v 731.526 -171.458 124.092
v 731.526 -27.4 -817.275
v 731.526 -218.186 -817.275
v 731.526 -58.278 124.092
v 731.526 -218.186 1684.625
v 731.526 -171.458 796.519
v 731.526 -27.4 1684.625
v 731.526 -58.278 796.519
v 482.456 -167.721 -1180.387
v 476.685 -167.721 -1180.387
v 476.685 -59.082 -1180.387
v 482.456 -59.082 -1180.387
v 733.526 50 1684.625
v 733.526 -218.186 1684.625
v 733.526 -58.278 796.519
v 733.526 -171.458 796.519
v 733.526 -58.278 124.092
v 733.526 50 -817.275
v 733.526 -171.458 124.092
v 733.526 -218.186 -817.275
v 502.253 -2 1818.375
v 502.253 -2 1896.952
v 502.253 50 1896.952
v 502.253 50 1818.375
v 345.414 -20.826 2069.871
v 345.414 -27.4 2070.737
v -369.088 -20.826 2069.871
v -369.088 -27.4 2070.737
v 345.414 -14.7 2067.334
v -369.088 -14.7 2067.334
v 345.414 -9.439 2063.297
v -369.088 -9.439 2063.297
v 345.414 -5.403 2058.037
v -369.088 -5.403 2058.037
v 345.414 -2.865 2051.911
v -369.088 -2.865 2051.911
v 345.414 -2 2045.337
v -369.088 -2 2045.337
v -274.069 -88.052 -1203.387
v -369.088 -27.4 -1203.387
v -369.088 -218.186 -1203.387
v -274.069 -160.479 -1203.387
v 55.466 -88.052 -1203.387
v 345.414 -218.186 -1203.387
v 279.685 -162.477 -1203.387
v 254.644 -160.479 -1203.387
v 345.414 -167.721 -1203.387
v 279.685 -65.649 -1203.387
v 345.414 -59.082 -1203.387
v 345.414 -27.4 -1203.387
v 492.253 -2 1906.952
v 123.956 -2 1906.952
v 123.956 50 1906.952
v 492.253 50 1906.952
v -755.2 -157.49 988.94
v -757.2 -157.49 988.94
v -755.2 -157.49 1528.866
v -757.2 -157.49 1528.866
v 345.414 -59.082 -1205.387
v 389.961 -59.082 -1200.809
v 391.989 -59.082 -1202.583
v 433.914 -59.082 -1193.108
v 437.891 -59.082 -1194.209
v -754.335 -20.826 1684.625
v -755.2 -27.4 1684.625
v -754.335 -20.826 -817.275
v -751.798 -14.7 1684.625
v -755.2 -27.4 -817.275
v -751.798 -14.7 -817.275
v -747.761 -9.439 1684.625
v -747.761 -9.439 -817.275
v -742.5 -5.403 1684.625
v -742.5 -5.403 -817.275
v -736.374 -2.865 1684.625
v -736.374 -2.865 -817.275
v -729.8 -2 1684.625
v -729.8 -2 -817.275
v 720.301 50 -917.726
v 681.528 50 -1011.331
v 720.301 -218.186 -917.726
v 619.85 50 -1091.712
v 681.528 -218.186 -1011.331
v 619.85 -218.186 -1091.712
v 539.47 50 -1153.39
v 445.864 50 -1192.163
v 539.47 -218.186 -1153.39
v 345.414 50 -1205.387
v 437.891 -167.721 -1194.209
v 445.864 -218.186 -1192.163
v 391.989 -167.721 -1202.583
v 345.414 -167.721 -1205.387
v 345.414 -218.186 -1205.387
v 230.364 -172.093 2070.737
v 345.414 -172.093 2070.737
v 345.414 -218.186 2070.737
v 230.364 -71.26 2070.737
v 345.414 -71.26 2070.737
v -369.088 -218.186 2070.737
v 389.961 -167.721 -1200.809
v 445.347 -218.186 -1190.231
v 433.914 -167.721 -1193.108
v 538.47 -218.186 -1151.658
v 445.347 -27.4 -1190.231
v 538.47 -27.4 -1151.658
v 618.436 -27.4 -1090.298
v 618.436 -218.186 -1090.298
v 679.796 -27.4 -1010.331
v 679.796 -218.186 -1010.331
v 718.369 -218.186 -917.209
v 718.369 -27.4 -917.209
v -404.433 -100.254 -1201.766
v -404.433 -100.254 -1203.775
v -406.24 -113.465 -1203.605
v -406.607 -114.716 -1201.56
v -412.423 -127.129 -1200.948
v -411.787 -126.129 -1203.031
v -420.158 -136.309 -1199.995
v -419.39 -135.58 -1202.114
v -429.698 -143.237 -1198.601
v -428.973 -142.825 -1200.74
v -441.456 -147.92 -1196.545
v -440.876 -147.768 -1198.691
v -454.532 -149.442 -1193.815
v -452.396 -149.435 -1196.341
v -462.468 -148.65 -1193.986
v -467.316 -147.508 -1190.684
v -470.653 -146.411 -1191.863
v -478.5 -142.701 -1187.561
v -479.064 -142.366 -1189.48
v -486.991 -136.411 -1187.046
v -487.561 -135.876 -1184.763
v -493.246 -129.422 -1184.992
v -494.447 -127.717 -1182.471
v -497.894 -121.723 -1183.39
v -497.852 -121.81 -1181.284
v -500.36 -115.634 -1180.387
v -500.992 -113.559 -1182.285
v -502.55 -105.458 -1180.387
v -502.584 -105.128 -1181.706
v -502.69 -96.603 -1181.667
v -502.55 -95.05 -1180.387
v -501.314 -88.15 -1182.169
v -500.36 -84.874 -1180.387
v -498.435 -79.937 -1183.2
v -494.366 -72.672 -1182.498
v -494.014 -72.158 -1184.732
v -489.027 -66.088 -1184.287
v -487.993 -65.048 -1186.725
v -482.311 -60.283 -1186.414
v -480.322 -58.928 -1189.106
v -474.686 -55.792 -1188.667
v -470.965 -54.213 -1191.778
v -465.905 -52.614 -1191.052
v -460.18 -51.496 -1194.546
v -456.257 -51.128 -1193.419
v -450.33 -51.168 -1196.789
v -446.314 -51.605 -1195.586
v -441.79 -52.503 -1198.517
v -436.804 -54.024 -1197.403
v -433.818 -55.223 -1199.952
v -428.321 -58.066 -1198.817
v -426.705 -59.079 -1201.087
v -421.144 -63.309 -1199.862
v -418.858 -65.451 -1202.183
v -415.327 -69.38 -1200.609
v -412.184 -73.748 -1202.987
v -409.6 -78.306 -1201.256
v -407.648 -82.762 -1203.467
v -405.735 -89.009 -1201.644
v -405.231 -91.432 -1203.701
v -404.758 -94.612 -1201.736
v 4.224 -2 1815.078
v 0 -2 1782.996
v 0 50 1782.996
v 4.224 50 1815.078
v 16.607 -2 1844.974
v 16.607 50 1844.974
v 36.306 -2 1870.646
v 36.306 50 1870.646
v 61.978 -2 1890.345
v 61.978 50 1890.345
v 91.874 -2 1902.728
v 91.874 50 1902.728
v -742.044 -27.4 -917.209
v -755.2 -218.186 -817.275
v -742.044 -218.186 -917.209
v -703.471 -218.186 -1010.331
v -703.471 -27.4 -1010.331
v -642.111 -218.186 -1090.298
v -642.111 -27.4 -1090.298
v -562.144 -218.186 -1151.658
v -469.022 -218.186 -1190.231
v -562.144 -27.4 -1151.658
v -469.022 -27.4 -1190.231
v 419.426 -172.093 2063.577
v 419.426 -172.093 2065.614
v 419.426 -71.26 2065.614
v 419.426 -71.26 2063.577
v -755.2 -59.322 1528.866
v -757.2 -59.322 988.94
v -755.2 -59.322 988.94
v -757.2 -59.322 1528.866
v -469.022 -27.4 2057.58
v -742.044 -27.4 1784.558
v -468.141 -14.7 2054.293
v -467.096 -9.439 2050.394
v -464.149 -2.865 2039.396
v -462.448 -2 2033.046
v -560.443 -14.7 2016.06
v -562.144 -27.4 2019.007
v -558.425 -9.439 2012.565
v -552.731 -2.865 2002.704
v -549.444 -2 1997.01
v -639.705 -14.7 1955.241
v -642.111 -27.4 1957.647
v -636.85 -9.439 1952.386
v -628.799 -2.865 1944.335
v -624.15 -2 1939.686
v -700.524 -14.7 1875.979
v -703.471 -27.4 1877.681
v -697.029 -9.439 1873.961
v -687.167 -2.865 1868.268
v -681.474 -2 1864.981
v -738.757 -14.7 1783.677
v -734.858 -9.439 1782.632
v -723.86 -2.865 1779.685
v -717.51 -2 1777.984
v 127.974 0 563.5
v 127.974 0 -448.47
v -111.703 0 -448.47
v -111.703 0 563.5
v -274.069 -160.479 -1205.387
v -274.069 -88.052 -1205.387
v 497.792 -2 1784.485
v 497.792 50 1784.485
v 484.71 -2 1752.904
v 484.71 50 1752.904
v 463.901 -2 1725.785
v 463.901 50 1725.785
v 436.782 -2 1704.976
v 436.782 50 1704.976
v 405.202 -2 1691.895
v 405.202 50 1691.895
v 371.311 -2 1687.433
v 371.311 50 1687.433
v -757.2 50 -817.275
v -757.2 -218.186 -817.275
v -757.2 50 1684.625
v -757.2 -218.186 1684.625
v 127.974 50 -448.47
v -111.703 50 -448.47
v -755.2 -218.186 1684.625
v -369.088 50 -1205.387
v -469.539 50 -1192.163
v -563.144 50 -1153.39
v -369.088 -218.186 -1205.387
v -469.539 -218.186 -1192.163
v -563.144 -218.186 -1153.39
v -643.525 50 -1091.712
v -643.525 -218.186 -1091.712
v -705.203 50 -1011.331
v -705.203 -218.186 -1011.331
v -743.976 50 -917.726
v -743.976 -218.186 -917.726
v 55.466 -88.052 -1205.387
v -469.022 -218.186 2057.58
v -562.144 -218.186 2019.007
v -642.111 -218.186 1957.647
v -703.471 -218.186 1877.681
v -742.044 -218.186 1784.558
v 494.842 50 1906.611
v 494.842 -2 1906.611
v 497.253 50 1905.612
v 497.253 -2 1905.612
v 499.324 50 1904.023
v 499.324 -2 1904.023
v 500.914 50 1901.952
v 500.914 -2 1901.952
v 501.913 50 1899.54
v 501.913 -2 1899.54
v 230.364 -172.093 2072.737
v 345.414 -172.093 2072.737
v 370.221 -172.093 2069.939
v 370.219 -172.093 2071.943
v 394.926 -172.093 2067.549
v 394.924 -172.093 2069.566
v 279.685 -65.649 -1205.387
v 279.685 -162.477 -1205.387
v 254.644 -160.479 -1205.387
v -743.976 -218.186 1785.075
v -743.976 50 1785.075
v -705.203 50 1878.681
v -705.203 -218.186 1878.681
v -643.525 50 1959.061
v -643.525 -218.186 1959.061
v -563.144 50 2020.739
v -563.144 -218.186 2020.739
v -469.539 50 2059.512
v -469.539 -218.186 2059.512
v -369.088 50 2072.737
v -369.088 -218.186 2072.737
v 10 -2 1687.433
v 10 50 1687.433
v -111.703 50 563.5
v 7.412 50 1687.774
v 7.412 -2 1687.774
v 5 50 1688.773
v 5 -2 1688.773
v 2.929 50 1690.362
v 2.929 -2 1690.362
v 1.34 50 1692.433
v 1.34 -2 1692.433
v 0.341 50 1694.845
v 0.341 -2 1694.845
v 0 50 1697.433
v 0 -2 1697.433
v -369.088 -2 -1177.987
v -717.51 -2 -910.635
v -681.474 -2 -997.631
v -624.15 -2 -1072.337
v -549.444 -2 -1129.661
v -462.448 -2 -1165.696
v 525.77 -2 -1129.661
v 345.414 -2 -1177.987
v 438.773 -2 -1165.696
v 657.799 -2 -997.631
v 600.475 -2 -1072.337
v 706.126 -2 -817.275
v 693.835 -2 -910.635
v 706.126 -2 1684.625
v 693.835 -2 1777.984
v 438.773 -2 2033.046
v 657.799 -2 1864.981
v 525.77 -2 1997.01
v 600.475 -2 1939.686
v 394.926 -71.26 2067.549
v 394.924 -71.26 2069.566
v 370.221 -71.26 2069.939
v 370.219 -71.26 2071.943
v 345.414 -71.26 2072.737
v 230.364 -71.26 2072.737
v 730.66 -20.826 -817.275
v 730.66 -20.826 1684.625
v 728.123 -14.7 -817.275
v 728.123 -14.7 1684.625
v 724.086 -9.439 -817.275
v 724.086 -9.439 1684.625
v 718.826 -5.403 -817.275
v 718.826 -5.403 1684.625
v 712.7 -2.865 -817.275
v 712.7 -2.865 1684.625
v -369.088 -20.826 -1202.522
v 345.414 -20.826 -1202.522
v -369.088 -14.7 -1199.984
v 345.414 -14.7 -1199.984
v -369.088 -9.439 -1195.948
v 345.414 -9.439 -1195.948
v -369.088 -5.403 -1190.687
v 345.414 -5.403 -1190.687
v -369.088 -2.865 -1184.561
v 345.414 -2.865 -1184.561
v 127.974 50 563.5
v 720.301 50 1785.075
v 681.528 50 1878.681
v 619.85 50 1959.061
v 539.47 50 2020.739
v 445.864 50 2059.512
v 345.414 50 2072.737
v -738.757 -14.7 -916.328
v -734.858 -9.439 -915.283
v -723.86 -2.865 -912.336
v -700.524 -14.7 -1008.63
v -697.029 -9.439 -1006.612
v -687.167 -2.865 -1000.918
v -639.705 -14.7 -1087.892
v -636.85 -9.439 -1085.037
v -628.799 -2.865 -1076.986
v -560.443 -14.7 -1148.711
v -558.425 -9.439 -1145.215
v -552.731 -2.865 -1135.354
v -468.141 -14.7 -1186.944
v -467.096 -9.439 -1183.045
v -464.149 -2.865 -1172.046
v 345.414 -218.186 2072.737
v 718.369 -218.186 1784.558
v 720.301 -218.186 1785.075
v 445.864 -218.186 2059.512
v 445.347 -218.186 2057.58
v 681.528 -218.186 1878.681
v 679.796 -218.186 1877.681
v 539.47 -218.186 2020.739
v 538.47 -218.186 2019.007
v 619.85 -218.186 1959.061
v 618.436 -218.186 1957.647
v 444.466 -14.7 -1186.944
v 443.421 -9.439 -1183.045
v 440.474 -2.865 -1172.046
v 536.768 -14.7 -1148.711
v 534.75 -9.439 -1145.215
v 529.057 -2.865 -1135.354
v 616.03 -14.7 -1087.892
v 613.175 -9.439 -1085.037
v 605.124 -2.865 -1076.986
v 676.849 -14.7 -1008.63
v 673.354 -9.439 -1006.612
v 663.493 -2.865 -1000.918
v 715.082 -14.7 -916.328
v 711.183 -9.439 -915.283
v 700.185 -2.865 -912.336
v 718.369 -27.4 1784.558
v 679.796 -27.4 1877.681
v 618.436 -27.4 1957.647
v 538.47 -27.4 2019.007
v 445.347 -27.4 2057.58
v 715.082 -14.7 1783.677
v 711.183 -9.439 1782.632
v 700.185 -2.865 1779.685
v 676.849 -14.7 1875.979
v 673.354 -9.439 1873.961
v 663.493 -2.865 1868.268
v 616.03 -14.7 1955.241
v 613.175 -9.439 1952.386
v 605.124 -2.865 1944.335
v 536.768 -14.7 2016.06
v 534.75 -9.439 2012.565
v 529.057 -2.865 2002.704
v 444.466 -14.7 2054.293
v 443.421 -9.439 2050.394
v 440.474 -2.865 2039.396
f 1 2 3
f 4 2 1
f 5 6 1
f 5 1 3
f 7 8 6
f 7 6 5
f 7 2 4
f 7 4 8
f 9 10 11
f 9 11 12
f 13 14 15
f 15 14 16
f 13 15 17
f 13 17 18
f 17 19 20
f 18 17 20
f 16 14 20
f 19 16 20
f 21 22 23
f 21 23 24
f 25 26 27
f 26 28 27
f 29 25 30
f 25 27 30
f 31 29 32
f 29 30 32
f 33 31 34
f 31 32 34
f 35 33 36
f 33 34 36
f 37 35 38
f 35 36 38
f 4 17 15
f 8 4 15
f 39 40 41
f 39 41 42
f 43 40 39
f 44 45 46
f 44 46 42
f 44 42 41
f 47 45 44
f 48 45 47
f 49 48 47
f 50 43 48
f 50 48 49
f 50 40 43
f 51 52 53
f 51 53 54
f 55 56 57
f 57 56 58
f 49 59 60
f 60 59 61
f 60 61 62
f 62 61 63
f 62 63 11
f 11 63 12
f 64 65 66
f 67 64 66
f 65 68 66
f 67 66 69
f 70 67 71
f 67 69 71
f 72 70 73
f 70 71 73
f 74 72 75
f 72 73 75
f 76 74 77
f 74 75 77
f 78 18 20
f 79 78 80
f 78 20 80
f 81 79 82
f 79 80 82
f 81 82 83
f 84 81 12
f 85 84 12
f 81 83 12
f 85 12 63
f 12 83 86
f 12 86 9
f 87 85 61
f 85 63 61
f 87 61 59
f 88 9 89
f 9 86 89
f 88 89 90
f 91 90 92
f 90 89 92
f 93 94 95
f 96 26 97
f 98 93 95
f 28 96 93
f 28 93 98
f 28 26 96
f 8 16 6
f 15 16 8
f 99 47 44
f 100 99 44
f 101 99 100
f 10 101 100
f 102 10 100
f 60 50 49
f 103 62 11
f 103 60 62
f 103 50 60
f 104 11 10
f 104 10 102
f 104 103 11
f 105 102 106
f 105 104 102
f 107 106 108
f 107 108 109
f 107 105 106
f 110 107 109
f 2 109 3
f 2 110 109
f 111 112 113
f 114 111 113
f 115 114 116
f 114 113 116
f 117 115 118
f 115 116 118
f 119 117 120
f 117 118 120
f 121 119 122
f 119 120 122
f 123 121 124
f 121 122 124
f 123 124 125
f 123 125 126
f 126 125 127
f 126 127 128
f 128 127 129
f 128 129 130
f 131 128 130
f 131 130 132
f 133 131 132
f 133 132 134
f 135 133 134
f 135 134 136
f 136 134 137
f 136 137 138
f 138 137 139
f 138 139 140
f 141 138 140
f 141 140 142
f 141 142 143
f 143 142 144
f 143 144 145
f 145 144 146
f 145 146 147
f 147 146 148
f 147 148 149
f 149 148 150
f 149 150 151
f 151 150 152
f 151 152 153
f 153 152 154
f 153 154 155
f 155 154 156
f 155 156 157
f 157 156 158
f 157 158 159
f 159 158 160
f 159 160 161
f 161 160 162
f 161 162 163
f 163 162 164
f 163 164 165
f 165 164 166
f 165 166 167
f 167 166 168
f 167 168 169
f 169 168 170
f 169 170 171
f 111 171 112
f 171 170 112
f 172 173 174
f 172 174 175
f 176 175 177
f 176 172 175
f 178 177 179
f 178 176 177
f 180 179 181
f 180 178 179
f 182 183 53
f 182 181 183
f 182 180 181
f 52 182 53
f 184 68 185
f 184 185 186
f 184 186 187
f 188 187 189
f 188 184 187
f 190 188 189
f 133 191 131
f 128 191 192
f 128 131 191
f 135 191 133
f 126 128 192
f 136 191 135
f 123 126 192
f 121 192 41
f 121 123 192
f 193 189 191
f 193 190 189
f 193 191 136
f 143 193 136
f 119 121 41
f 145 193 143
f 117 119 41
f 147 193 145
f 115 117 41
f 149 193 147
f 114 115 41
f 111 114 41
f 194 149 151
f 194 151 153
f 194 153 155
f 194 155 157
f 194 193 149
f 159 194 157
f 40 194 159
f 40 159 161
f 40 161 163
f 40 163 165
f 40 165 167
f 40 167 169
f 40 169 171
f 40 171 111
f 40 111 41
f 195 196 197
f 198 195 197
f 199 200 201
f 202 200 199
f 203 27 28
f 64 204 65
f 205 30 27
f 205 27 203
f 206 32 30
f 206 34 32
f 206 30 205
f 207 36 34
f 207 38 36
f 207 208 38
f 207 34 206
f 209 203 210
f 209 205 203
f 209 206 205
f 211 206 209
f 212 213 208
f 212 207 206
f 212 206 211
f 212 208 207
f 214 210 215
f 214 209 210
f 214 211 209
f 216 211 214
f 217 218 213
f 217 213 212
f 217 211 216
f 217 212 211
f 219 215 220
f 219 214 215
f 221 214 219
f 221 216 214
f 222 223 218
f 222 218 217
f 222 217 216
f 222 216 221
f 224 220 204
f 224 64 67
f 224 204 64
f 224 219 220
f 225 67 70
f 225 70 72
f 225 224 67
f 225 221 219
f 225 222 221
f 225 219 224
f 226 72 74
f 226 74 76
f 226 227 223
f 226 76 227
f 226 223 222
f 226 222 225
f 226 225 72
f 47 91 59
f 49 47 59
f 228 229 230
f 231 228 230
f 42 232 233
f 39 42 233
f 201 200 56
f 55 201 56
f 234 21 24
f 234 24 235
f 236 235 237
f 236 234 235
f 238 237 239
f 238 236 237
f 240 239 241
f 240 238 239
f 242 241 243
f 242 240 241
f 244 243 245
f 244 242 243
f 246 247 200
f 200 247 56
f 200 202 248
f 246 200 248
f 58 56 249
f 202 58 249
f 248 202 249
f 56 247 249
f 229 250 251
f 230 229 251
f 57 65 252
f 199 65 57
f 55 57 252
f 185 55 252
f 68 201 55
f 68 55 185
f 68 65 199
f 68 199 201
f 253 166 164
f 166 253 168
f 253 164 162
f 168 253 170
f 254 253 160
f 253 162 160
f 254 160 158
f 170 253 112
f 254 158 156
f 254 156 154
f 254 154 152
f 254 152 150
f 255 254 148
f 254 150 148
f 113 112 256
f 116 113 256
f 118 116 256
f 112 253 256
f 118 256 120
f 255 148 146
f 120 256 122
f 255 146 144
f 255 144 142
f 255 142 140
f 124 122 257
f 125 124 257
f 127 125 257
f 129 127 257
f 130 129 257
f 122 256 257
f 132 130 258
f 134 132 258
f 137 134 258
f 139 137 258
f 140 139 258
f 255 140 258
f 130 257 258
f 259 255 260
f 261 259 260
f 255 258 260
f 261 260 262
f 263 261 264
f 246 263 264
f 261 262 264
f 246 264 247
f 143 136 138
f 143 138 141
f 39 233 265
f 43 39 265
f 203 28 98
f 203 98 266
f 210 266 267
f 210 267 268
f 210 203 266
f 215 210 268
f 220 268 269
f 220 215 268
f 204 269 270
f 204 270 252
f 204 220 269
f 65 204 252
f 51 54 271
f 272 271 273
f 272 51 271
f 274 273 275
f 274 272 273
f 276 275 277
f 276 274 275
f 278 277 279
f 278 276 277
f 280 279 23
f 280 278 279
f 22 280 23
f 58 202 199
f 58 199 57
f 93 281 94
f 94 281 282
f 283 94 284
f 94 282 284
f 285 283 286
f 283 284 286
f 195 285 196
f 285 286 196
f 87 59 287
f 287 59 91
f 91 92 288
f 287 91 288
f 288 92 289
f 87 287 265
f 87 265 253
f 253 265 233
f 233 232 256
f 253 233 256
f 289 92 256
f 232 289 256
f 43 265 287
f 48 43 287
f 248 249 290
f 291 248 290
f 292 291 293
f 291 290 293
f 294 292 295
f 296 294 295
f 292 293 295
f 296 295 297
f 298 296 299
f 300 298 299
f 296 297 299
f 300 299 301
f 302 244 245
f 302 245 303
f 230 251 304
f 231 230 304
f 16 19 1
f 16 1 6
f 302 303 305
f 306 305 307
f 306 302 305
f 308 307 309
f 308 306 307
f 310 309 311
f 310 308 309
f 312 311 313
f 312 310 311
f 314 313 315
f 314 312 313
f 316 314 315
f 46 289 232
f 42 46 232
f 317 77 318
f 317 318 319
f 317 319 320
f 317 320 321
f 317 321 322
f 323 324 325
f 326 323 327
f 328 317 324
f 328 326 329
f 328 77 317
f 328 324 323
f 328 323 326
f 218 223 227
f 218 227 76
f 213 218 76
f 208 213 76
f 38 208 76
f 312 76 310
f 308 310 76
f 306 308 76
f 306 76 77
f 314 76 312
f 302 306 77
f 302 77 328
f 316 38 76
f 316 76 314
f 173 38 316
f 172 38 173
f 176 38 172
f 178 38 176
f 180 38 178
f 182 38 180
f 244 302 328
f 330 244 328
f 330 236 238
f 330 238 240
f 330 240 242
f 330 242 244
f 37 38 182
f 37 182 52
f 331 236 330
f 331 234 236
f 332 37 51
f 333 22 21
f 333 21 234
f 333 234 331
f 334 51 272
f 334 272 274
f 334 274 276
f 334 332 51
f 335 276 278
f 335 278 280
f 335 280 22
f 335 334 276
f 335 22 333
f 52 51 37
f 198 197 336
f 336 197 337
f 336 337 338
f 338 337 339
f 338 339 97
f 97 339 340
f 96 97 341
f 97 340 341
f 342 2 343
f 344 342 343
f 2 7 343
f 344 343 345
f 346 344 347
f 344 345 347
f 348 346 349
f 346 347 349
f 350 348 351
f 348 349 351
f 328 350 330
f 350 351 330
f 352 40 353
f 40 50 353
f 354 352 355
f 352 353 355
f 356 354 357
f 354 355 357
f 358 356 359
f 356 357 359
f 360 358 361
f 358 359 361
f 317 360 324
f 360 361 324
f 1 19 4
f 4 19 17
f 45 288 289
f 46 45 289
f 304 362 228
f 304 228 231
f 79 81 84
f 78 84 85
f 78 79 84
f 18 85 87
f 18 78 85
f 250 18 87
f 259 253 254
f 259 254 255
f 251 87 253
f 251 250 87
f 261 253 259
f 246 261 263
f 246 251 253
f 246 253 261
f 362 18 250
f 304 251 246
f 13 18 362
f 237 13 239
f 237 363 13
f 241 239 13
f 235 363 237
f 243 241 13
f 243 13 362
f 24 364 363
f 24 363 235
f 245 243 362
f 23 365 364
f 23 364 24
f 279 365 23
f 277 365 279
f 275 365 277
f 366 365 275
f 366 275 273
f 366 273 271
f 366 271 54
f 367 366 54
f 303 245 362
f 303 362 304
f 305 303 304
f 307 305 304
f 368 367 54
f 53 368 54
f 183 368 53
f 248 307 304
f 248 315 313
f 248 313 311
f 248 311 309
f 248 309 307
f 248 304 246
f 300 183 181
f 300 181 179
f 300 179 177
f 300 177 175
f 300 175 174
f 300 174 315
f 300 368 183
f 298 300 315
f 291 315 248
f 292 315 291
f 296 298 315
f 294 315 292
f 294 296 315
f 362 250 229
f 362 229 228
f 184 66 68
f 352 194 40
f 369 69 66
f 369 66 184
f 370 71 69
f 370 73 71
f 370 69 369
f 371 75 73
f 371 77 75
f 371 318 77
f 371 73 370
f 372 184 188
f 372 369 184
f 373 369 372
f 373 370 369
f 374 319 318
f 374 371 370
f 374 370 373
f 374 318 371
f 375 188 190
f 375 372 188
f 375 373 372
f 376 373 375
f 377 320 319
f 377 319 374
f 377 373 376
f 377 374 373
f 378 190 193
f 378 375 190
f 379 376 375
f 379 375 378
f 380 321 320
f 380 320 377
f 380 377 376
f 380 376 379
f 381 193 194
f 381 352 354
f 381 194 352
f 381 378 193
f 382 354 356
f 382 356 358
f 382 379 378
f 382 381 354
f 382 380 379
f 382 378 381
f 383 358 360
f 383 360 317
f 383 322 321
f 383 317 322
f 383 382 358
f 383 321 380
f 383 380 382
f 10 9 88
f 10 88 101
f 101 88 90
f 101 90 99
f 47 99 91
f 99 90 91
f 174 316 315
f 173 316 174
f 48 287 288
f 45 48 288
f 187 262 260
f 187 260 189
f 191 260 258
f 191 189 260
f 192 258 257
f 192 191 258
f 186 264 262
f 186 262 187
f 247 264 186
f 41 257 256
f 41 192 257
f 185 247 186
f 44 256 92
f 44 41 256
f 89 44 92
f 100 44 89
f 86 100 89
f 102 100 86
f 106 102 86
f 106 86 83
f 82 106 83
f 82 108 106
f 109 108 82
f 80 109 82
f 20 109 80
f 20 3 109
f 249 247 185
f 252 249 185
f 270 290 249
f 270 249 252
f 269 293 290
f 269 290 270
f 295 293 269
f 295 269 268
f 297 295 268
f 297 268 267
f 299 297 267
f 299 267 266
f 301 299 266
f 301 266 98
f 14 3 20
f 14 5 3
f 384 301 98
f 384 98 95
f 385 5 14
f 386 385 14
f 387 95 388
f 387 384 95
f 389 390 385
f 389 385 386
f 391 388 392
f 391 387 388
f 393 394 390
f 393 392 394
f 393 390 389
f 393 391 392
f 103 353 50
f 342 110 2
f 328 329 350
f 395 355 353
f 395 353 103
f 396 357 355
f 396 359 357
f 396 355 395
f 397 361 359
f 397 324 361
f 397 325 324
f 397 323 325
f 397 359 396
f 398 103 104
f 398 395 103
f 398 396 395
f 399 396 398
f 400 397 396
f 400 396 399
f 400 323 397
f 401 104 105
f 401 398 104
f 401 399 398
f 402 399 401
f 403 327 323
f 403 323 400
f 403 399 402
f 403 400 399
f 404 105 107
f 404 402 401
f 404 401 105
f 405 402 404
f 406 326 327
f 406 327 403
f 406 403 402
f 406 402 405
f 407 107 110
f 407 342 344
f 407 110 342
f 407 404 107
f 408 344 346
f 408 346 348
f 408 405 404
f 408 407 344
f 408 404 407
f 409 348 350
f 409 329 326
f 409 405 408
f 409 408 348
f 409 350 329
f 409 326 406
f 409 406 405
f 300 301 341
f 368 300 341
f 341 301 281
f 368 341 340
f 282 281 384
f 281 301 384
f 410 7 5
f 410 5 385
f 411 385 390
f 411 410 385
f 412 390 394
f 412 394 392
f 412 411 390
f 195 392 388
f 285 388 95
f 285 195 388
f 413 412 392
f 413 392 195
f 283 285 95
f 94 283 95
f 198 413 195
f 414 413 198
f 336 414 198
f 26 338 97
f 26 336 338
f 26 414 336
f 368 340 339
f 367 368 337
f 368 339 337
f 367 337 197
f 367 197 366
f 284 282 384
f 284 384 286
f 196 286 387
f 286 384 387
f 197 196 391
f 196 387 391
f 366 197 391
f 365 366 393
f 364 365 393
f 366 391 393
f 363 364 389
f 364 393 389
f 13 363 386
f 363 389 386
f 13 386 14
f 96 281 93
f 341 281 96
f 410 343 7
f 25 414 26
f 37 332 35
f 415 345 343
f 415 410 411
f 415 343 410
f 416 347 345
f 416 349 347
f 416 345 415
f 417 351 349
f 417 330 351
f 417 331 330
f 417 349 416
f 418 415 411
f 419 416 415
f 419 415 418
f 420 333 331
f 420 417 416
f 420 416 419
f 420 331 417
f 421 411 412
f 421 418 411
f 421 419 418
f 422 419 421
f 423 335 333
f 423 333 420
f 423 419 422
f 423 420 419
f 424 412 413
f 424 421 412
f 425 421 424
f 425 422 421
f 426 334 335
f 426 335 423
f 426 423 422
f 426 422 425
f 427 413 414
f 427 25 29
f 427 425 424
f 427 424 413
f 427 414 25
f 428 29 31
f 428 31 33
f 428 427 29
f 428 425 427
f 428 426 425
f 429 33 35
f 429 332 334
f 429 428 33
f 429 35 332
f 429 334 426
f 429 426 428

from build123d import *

# Parameters (mm, degrees)
F1_DEPTH  = 218.186
F2_T      = -2
F3_R      = 25.4
F4_W      = 98.1684550643
F4_H      = 539.9262309074
F5_DEPTH  = 25
F6_W      = 115.0492340008
F6_H      = 100.8328720927
F6_W_2    = 74.0123927912
F7_DEPTH  = 25
F8_R      = 49.1963337308
F9_DEPTH  = 25
F10_W     = 113.1808534265
F10_H     = 672.4274903536
F11_DEPTH = 25
F14_DEPTH = 25
F15_DEPTH = 50
F16_DEPTH = 115
F17_W     = 239.6771460772
F17_H     = 1011.9701325893
F18_DEPTH = 50


# Not quite as in the source:
# - a feature names something its author has since deleted; it is built from what else it names


with BuildPart() as f1:
    # F0 (on Front) → F1 (new body)
    with BuildSketch(Plane.XZ):
        with BuildLine():
            Line((345.4135119597, 2072.7365876565), (-369.0884880403, 2072.7365876565))
            ThreePointArc((-369.0884880403, 2072.7365876565), (-643.5251151002, 1959.0612147164), (-757.2004880403, 1684.6245876565))
            Line((-757.2004880403, 1684.6245876565), (-757.2004880403, -817.2754123435))
            ThreePointArc((-757.2004880403, -817.2754123435), (-643.5251151002, -1091.7120394034), (-369.0884880403, -1205.3874123435))
            Line((-369.0884880403, -1205.3874123435), (345.4135119597, -1205.3874123435))
            ThreePointArc((345.4135119597, -1205.3874123435), (619.8501390195, -1091.7120394034), (733.5255119597, -817.2754123435))
            Line((733.5255119597, -817.2754123435), (733.5255119597, 1684.6245876565))
            ThreePointArc((733.5255119597, 1684.6245876565), (619.8501390195, 1959.0612147164), (345.4135119597, 2072.7365876565))
        make_face()
    extrude(amount=F1_DEPTH)

    # F2
    f2_openings = [f1.faces().sort_by_distance(p)[0] for p in [
        (-11.837488, -218.186, 433.674588),
    ]]
    offset(amount=F2_T, openings=f2_openings)

    # F3
    f3_edges = [f1.edges().sort_by_distance(p)[0] for p in [
        (731.525512, -2, 433.674588),
    ]]
    fillet(f3_edges, radius=F3_R)

    # F4 (on face) → F5 (cut)
    with BuildSketch(Plane(origin=(-757.2004880403, 0, 0), x_dir=(0, -1, 0), z_dir=(-1, 0, 0))):
        with Locations((108.4061600268, 1258.9028179646)):
            Rectangle(F4_W, F4_H)
    extrude(amount=-F5_DEPTH, mode=Mode.SUBTRACT)

    # F6 (on face) → F7 (cut)
    with BuildSketch(Plane.XY.offset(2072.7365876565)):
        with Locations((287.8888949593, -121.6761954129)):
            Rectangle(F6_W, F6_H)
        with Locations((382.4197083552, -121.6761954129)):
            Rectangle(F6_W_2, F6_H)
    extrude(amount=-F7_DEPTH, mode=Mode.SUBTRACT)

    # F8 (on face) → F9 (cut)
    with BuildSketch(Plane(origin=(0, 0, -1205.3874123435), x_dir=(1, 0, 0), z_dir=(0, 0, -1))):
        Polygon((254.6437084675, 88.0523696542), (55.4660335183, 88.0523696542), (256.1990016318, 67.995804056), align=None)
        Polygon((254.6437084675, 160.4788154364), (-274.0693688393, 160.4788154364), (-274.0693688393, 88.0523696542), (55.4660335183, 88.0523696542), (254.6437084675, 88.0523696542), align=None)
        Polygon((279.685367193, 162.4769285816), (254.6437084675, 160.4788154364), (254.6437084675, 88.0523696542), (256.1990016318, 67.995804056), (279.685367193, 65.6491251025), align=None)
        Polygon((439.4082129002, 167.7214801311), (345.4135119597, 167.7214801311), (345.4135119597, 59.0817891061), (439.4082129002, 59.0817891061), (588.7299776077, 59.0817891061), (588.7299776077, 167.7214801311), align=None)
        with Locations((-453.6294341087, 100.253932178)):
            Circle(F8_R)
    extrude(amount=-F9_DEPTH, mode=Mode.SUBTRACT)

    # F10 (on face) → F11 (cut)
    with BuildSketch(Plane.YZ.offset(733.5255119597)):
        with Locations((-114.8680560291, 460.3053554893)):
            Rectangle(F10_W, F10_H)
    extrude(amount=-F11_DEPTH, mode=Mode.SUBTRACT)

    # F13 (on face) → F14 (cut)
    with BuildSketch(Plane(origin=(0, 0, 0), x_dir=(-1, 0, 0), z_dir=(0, 1, 0))):
        with BuildLine():
            Line((-123.95587248, 1906.9520282745), (-492.2534132004, 1906.9520282745))
            ThreePointArc((-492.2534132004, 1906.9520282745), (-499.3244810122, 1904.0230960864), (-502.2534132004, 1896.9520282745))
            Line((-502.2534132004, 1896.9520282745), (-502.2534132004, 1818.3750739625))
            ThreePointArc((-502.2534132004, 1818.3750739625), (-463.9013340465, 1725.7849643239), (-371.3112244078, 1687.43288517))
            Line((-371.3112244078, 1687.43288517), (-10, 1687.43288517))
            ThreePointArc((-10, 1687.43288517), (-2.9289321881, 1690.3618173581), (0, 1697.43288517))
            Line((0, 1697.43288517), (0, 1782.9961557945))
            ThreePointArc((0, 1782.9961557945), (-36.3058344815, 1870.646193793), (-123.95587248, 1906.9520282745))
        make_face()
    extrude(amount=-F14_DEPTH, mode=Mode.SUBTRACT)

    # F12 (on face) → F15 (join)
    with BuildSketch(Plane(origin=(0, 0, 0), x_dir=(-1, 0, 0), z_dir=(0, 1, 0))):
        with BuildLine():
            Line((369.0884880403, 2072.7365876565), (-345.4135119597, 2072.7365876565))
            ThreePointArc((-345.4135119597, 2072.7365876565), (-619.8501390195, 1959.0612147164), (-733.5255119597, 1684.6245876565))
            Line((-733.5255119597, 1684.6245876565), (-733.5255119597, -817.2754123435))
            ThreePointArc((-733.5255119597, -817.2754123435), (-619.8501390195, -1091.7120394034), (-345.4135119597, -1205.3874123435))
            Line((-345.4135119597, -1205.3874123435), (369.0884880403, -1205.3874123435))
            ThreePointArc((369.0884880403, -1205.3874123435), (643.5251151002, -1091.7120394034), (757.2004880403, -817.2754123435))
            Line((757.2004880403, -817.2754123435), (757.2004880403, 1684.6245876565))
            ThreePointArc((757.2004880403, 1684.6245876565), (643.5251151002, 1959.0612147164), (369.0884880403, 2072.7365876565))
        make_face()
    extrude(amount=F15_DEPTH)

    # F16 (cut): a face of the model
    f16_faces = [f1.faces().sort_by_distance(p)[0] for p in [
        (250.3551806522, 0, 1797.440656852),
    ]]
    extrude(f16_faces, amount=-F16_DEPTH, mode=Mode.SUBTRACT)

    # F17 (on face) → F18 (cut)
    with BuildSketch(Plane(origin=(0, 50, 0), x_dir=(-1, 0, 0), z_dir=(0, 1, 0))):
        with Locations((-8.1355944276, 57.5146228075)):
            Rectangle(F17_W, F17_H)
    extrude(amount=-F18_DEPTH, mode=Mode.SUBTRACT)


solid = f1.part
